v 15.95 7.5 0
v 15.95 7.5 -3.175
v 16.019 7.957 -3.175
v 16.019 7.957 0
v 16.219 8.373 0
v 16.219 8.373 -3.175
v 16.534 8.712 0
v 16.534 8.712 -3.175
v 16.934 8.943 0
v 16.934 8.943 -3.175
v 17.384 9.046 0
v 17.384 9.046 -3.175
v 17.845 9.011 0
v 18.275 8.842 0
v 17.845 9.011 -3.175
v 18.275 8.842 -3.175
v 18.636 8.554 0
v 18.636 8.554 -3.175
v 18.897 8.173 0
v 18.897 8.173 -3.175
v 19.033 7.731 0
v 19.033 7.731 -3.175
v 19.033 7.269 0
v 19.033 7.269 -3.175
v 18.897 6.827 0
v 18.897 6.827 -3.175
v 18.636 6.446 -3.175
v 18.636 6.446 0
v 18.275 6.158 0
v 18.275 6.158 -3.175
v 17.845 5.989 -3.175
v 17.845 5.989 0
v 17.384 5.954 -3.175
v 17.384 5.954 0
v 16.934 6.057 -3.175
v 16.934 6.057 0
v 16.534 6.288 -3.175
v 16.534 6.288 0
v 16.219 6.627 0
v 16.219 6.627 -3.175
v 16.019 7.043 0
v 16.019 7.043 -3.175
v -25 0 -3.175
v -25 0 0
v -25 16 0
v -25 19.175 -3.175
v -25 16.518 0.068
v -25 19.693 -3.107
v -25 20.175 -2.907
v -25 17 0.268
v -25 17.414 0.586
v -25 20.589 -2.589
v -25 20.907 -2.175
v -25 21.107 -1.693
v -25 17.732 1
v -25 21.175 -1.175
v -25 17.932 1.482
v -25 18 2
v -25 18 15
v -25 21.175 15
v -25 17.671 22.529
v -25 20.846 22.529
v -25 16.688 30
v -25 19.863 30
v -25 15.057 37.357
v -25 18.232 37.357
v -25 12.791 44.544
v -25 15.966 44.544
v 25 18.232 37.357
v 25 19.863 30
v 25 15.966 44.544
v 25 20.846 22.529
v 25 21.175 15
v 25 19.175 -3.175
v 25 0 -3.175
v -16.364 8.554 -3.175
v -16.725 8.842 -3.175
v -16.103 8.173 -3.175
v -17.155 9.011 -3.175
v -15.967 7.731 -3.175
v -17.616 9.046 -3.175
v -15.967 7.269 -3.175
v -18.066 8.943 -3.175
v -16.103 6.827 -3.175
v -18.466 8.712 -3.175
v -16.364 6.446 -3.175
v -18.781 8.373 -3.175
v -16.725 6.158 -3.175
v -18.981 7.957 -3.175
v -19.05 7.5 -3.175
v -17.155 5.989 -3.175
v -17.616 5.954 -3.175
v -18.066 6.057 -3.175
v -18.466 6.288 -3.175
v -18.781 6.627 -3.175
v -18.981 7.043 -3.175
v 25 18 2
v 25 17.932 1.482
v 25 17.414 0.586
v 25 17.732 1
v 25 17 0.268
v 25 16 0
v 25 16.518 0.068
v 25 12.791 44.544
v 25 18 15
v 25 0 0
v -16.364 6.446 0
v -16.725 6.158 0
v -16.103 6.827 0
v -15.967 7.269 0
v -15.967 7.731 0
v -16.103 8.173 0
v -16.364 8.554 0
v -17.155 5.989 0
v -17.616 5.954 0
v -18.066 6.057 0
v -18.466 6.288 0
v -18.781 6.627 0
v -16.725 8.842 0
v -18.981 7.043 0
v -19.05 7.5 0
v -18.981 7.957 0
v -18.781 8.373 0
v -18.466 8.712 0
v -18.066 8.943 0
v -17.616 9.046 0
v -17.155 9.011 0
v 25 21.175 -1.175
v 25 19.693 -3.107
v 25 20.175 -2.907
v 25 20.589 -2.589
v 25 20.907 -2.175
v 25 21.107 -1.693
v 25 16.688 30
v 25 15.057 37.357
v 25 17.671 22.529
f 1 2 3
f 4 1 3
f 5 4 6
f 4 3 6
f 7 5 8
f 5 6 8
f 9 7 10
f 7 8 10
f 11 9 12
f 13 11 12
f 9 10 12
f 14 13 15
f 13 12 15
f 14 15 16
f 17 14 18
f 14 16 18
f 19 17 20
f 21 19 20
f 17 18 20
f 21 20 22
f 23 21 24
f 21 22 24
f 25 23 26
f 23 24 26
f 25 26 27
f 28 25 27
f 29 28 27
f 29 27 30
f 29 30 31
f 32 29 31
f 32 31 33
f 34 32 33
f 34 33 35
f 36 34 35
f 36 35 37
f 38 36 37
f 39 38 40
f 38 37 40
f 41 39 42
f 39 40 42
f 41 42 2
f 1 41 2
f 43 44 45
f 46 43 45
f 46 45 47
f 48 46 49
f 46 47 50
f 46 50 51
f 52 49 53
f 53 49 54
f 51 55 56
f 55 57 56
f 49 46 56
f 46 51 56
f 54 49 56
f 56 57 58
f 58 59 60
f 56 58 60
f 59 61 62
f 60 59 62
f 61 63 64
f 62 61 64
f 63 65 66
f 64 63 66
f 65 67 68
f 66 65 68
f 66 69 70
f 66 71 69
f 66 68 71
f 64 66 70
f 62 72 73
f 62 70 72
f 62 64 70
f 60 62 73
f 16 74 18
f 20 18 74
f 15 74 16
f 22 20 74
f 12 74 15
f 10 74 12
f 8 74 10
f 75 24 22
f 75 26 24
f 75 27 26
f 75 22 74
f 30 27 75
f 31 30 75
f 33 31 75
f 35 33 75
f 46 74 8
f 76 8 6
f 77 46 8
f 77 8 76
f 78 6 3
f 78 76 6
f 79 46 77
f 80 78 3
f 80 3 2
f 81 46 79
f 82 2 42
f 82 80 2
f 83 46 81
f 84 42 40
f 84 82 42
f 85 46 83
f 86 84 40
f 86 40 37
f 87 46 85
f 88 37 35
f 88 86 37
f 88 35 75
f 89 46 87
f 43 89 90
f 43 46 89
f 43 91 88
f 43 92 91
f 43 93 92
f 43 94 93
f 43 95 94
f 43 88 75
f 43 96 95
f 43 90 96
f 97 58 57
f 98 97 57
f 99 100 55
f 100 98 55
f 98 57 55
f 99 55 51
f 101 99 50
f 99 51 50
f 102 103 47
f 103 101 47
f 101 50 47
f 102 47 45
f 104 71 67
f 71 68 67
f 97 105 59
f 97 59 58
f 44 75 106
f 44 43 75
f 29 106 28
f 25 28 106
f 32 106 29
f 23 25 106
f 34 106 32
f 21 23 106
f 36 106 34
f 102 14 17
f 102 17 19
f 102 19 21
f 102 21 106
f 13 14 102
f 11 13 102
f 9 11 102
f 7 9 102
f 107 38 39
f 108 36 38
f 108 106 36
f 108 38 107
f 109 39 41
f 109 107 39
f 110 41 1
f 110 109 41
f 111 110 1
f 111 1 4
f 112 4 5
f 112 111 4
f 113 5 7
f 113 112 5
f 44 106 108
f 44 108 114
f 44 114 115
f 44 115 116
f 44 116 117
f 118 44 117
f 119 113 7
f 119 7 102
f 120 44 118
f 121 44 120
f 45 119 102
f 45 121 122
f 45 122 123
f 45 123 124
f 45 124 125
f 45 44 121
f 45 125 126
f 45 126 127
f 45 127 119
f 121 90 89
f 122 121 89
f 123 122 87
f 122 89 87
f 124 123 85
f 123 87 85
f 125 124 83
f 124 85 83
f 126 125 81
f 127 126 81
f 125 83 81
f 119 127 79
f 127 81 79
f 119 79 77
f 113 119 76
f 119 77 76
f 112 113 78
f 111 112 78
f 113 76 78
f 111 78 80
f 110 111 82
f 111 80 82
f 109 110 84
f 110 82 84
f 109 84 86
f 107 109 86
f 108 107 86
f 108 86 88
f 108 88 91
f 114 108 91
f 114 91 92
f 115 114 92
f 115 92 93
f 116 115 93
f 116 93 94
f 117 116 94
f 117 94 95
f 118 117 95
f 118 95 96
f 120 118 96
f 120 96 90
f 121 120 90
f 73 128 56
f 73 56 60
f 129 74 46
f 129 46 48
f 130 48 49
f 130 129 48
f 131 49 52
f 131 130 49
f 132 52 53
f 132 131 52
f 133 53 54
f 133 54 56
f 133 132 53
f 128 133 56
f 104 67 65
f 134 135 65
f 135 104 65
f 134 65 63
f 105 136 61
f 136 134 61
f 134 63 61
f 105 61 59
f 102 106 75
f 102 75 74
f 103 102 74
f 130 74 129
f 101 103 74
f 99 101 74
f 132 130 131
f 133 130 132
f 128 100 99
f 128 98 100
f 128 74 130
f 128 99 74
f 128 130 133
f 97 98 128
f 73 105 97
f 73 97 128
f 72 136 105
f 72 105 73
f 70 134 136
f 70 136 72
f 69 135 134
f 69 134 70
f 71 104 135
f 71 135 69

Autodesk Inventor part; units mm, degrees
ref_plane "YZ Plane" through (0, 0, 0) normal (1, 0, 0) x (0, 1, 0)
ref_plane "XZ Plane" through (0, 0, 0) normal (0, 1, 0) x (-1, 0, 0)
ref_plane "XY Plane" through (0, 0, 0) normal (0, 0, 1) x (1, 0, 0)
sketch "Sketch1" plane through (0, 0, 0) normal (1, 0, 0) x (0, 1, 0)
  line L0 (0, 0) -> (18, 0)
  line L1 (18, 0) -> (18, -3.175)
  line L2 (18, -3.175) -> (0, -3.175)
  line L3 (0, -3.175) -> (0, 0)
  line L4 (18, 0) -> (21.175, 0)
  line L5 (21.175, 0) -> (21.175, 15)
  line L6 (21.175, 15) -> (18, 15)
  line L7 (18, 15) -> (18, 0)
  line L8 (21.175, 0) -> (18, 0)
  line L9 (18, 0) -> (18, -3.175)
  line L10 (18, -3.175) -> (21.175, -3.175)
  line L11 (21.175, -3.175) -> (21.175, 0)
  arc A0 (21.175, 15) -> (15.9656, 44.5442) centre (-65.2066, 15) ccw
  line L12 (21.175, 15) -> (15.9656, 44.5442) construction
  line L13 (21.175, 15) -> (51.175, 15) construction
  line L14 (15.9656, 44.5442) -> (12.7906, 44.5442)
  arc A1 (18, 15) -> (12.7906, 44.5442) centre (-68.3816, 15) ccw
  line L15 (18, 15) -> (12.7906, 44.5442) construction
  line L16 (18, 15) -> (48, 15) construction
  dimension "d0" = 18
  dimension "d1" = 3.175
  dimension "d2" = 3.175
  dimension "d3" = 15
  dimension "d4" = 30
  dimension "d5" = 100
  dimension "d7" = 30
  dimension "d8" = 100
extrude "Extrusion1" add sketch "Sketch1" along normal mid plane 50
fillet "Fillet1" radius 2 2 edges at (0, 18, 0) (0, 21.175, -3.175)
sketch "Sketch2" plane through (25, 0, -3.175) normal (0, 0, -1) x (-1, 0, 0)
  line L0 (0, 0) -> (0, 19.175) projected
  line L1 (25, 0) -> (0, 0) projected
  line L2 (50, 19.175) -> (50, 0) projected
  line L3 (50, 7.5) -> (0, 7.5) construction
  circle A0 centre (7.5, 7.5) radius 1.55
  circle A1 centre (42.5, 7.5) radius 1.55
  dimension "d12" = 7.5
  dimension "d13" = 3.1
  dimension "d14" = 3.1
  dimension "d15" = 7.5
  dimension "d16" = 7.5
extrude "Extrusion2" cut sketch "Sketch2" against normal blind 10
properties part number "PolyWedge" material "PC/ABS Plastic"
